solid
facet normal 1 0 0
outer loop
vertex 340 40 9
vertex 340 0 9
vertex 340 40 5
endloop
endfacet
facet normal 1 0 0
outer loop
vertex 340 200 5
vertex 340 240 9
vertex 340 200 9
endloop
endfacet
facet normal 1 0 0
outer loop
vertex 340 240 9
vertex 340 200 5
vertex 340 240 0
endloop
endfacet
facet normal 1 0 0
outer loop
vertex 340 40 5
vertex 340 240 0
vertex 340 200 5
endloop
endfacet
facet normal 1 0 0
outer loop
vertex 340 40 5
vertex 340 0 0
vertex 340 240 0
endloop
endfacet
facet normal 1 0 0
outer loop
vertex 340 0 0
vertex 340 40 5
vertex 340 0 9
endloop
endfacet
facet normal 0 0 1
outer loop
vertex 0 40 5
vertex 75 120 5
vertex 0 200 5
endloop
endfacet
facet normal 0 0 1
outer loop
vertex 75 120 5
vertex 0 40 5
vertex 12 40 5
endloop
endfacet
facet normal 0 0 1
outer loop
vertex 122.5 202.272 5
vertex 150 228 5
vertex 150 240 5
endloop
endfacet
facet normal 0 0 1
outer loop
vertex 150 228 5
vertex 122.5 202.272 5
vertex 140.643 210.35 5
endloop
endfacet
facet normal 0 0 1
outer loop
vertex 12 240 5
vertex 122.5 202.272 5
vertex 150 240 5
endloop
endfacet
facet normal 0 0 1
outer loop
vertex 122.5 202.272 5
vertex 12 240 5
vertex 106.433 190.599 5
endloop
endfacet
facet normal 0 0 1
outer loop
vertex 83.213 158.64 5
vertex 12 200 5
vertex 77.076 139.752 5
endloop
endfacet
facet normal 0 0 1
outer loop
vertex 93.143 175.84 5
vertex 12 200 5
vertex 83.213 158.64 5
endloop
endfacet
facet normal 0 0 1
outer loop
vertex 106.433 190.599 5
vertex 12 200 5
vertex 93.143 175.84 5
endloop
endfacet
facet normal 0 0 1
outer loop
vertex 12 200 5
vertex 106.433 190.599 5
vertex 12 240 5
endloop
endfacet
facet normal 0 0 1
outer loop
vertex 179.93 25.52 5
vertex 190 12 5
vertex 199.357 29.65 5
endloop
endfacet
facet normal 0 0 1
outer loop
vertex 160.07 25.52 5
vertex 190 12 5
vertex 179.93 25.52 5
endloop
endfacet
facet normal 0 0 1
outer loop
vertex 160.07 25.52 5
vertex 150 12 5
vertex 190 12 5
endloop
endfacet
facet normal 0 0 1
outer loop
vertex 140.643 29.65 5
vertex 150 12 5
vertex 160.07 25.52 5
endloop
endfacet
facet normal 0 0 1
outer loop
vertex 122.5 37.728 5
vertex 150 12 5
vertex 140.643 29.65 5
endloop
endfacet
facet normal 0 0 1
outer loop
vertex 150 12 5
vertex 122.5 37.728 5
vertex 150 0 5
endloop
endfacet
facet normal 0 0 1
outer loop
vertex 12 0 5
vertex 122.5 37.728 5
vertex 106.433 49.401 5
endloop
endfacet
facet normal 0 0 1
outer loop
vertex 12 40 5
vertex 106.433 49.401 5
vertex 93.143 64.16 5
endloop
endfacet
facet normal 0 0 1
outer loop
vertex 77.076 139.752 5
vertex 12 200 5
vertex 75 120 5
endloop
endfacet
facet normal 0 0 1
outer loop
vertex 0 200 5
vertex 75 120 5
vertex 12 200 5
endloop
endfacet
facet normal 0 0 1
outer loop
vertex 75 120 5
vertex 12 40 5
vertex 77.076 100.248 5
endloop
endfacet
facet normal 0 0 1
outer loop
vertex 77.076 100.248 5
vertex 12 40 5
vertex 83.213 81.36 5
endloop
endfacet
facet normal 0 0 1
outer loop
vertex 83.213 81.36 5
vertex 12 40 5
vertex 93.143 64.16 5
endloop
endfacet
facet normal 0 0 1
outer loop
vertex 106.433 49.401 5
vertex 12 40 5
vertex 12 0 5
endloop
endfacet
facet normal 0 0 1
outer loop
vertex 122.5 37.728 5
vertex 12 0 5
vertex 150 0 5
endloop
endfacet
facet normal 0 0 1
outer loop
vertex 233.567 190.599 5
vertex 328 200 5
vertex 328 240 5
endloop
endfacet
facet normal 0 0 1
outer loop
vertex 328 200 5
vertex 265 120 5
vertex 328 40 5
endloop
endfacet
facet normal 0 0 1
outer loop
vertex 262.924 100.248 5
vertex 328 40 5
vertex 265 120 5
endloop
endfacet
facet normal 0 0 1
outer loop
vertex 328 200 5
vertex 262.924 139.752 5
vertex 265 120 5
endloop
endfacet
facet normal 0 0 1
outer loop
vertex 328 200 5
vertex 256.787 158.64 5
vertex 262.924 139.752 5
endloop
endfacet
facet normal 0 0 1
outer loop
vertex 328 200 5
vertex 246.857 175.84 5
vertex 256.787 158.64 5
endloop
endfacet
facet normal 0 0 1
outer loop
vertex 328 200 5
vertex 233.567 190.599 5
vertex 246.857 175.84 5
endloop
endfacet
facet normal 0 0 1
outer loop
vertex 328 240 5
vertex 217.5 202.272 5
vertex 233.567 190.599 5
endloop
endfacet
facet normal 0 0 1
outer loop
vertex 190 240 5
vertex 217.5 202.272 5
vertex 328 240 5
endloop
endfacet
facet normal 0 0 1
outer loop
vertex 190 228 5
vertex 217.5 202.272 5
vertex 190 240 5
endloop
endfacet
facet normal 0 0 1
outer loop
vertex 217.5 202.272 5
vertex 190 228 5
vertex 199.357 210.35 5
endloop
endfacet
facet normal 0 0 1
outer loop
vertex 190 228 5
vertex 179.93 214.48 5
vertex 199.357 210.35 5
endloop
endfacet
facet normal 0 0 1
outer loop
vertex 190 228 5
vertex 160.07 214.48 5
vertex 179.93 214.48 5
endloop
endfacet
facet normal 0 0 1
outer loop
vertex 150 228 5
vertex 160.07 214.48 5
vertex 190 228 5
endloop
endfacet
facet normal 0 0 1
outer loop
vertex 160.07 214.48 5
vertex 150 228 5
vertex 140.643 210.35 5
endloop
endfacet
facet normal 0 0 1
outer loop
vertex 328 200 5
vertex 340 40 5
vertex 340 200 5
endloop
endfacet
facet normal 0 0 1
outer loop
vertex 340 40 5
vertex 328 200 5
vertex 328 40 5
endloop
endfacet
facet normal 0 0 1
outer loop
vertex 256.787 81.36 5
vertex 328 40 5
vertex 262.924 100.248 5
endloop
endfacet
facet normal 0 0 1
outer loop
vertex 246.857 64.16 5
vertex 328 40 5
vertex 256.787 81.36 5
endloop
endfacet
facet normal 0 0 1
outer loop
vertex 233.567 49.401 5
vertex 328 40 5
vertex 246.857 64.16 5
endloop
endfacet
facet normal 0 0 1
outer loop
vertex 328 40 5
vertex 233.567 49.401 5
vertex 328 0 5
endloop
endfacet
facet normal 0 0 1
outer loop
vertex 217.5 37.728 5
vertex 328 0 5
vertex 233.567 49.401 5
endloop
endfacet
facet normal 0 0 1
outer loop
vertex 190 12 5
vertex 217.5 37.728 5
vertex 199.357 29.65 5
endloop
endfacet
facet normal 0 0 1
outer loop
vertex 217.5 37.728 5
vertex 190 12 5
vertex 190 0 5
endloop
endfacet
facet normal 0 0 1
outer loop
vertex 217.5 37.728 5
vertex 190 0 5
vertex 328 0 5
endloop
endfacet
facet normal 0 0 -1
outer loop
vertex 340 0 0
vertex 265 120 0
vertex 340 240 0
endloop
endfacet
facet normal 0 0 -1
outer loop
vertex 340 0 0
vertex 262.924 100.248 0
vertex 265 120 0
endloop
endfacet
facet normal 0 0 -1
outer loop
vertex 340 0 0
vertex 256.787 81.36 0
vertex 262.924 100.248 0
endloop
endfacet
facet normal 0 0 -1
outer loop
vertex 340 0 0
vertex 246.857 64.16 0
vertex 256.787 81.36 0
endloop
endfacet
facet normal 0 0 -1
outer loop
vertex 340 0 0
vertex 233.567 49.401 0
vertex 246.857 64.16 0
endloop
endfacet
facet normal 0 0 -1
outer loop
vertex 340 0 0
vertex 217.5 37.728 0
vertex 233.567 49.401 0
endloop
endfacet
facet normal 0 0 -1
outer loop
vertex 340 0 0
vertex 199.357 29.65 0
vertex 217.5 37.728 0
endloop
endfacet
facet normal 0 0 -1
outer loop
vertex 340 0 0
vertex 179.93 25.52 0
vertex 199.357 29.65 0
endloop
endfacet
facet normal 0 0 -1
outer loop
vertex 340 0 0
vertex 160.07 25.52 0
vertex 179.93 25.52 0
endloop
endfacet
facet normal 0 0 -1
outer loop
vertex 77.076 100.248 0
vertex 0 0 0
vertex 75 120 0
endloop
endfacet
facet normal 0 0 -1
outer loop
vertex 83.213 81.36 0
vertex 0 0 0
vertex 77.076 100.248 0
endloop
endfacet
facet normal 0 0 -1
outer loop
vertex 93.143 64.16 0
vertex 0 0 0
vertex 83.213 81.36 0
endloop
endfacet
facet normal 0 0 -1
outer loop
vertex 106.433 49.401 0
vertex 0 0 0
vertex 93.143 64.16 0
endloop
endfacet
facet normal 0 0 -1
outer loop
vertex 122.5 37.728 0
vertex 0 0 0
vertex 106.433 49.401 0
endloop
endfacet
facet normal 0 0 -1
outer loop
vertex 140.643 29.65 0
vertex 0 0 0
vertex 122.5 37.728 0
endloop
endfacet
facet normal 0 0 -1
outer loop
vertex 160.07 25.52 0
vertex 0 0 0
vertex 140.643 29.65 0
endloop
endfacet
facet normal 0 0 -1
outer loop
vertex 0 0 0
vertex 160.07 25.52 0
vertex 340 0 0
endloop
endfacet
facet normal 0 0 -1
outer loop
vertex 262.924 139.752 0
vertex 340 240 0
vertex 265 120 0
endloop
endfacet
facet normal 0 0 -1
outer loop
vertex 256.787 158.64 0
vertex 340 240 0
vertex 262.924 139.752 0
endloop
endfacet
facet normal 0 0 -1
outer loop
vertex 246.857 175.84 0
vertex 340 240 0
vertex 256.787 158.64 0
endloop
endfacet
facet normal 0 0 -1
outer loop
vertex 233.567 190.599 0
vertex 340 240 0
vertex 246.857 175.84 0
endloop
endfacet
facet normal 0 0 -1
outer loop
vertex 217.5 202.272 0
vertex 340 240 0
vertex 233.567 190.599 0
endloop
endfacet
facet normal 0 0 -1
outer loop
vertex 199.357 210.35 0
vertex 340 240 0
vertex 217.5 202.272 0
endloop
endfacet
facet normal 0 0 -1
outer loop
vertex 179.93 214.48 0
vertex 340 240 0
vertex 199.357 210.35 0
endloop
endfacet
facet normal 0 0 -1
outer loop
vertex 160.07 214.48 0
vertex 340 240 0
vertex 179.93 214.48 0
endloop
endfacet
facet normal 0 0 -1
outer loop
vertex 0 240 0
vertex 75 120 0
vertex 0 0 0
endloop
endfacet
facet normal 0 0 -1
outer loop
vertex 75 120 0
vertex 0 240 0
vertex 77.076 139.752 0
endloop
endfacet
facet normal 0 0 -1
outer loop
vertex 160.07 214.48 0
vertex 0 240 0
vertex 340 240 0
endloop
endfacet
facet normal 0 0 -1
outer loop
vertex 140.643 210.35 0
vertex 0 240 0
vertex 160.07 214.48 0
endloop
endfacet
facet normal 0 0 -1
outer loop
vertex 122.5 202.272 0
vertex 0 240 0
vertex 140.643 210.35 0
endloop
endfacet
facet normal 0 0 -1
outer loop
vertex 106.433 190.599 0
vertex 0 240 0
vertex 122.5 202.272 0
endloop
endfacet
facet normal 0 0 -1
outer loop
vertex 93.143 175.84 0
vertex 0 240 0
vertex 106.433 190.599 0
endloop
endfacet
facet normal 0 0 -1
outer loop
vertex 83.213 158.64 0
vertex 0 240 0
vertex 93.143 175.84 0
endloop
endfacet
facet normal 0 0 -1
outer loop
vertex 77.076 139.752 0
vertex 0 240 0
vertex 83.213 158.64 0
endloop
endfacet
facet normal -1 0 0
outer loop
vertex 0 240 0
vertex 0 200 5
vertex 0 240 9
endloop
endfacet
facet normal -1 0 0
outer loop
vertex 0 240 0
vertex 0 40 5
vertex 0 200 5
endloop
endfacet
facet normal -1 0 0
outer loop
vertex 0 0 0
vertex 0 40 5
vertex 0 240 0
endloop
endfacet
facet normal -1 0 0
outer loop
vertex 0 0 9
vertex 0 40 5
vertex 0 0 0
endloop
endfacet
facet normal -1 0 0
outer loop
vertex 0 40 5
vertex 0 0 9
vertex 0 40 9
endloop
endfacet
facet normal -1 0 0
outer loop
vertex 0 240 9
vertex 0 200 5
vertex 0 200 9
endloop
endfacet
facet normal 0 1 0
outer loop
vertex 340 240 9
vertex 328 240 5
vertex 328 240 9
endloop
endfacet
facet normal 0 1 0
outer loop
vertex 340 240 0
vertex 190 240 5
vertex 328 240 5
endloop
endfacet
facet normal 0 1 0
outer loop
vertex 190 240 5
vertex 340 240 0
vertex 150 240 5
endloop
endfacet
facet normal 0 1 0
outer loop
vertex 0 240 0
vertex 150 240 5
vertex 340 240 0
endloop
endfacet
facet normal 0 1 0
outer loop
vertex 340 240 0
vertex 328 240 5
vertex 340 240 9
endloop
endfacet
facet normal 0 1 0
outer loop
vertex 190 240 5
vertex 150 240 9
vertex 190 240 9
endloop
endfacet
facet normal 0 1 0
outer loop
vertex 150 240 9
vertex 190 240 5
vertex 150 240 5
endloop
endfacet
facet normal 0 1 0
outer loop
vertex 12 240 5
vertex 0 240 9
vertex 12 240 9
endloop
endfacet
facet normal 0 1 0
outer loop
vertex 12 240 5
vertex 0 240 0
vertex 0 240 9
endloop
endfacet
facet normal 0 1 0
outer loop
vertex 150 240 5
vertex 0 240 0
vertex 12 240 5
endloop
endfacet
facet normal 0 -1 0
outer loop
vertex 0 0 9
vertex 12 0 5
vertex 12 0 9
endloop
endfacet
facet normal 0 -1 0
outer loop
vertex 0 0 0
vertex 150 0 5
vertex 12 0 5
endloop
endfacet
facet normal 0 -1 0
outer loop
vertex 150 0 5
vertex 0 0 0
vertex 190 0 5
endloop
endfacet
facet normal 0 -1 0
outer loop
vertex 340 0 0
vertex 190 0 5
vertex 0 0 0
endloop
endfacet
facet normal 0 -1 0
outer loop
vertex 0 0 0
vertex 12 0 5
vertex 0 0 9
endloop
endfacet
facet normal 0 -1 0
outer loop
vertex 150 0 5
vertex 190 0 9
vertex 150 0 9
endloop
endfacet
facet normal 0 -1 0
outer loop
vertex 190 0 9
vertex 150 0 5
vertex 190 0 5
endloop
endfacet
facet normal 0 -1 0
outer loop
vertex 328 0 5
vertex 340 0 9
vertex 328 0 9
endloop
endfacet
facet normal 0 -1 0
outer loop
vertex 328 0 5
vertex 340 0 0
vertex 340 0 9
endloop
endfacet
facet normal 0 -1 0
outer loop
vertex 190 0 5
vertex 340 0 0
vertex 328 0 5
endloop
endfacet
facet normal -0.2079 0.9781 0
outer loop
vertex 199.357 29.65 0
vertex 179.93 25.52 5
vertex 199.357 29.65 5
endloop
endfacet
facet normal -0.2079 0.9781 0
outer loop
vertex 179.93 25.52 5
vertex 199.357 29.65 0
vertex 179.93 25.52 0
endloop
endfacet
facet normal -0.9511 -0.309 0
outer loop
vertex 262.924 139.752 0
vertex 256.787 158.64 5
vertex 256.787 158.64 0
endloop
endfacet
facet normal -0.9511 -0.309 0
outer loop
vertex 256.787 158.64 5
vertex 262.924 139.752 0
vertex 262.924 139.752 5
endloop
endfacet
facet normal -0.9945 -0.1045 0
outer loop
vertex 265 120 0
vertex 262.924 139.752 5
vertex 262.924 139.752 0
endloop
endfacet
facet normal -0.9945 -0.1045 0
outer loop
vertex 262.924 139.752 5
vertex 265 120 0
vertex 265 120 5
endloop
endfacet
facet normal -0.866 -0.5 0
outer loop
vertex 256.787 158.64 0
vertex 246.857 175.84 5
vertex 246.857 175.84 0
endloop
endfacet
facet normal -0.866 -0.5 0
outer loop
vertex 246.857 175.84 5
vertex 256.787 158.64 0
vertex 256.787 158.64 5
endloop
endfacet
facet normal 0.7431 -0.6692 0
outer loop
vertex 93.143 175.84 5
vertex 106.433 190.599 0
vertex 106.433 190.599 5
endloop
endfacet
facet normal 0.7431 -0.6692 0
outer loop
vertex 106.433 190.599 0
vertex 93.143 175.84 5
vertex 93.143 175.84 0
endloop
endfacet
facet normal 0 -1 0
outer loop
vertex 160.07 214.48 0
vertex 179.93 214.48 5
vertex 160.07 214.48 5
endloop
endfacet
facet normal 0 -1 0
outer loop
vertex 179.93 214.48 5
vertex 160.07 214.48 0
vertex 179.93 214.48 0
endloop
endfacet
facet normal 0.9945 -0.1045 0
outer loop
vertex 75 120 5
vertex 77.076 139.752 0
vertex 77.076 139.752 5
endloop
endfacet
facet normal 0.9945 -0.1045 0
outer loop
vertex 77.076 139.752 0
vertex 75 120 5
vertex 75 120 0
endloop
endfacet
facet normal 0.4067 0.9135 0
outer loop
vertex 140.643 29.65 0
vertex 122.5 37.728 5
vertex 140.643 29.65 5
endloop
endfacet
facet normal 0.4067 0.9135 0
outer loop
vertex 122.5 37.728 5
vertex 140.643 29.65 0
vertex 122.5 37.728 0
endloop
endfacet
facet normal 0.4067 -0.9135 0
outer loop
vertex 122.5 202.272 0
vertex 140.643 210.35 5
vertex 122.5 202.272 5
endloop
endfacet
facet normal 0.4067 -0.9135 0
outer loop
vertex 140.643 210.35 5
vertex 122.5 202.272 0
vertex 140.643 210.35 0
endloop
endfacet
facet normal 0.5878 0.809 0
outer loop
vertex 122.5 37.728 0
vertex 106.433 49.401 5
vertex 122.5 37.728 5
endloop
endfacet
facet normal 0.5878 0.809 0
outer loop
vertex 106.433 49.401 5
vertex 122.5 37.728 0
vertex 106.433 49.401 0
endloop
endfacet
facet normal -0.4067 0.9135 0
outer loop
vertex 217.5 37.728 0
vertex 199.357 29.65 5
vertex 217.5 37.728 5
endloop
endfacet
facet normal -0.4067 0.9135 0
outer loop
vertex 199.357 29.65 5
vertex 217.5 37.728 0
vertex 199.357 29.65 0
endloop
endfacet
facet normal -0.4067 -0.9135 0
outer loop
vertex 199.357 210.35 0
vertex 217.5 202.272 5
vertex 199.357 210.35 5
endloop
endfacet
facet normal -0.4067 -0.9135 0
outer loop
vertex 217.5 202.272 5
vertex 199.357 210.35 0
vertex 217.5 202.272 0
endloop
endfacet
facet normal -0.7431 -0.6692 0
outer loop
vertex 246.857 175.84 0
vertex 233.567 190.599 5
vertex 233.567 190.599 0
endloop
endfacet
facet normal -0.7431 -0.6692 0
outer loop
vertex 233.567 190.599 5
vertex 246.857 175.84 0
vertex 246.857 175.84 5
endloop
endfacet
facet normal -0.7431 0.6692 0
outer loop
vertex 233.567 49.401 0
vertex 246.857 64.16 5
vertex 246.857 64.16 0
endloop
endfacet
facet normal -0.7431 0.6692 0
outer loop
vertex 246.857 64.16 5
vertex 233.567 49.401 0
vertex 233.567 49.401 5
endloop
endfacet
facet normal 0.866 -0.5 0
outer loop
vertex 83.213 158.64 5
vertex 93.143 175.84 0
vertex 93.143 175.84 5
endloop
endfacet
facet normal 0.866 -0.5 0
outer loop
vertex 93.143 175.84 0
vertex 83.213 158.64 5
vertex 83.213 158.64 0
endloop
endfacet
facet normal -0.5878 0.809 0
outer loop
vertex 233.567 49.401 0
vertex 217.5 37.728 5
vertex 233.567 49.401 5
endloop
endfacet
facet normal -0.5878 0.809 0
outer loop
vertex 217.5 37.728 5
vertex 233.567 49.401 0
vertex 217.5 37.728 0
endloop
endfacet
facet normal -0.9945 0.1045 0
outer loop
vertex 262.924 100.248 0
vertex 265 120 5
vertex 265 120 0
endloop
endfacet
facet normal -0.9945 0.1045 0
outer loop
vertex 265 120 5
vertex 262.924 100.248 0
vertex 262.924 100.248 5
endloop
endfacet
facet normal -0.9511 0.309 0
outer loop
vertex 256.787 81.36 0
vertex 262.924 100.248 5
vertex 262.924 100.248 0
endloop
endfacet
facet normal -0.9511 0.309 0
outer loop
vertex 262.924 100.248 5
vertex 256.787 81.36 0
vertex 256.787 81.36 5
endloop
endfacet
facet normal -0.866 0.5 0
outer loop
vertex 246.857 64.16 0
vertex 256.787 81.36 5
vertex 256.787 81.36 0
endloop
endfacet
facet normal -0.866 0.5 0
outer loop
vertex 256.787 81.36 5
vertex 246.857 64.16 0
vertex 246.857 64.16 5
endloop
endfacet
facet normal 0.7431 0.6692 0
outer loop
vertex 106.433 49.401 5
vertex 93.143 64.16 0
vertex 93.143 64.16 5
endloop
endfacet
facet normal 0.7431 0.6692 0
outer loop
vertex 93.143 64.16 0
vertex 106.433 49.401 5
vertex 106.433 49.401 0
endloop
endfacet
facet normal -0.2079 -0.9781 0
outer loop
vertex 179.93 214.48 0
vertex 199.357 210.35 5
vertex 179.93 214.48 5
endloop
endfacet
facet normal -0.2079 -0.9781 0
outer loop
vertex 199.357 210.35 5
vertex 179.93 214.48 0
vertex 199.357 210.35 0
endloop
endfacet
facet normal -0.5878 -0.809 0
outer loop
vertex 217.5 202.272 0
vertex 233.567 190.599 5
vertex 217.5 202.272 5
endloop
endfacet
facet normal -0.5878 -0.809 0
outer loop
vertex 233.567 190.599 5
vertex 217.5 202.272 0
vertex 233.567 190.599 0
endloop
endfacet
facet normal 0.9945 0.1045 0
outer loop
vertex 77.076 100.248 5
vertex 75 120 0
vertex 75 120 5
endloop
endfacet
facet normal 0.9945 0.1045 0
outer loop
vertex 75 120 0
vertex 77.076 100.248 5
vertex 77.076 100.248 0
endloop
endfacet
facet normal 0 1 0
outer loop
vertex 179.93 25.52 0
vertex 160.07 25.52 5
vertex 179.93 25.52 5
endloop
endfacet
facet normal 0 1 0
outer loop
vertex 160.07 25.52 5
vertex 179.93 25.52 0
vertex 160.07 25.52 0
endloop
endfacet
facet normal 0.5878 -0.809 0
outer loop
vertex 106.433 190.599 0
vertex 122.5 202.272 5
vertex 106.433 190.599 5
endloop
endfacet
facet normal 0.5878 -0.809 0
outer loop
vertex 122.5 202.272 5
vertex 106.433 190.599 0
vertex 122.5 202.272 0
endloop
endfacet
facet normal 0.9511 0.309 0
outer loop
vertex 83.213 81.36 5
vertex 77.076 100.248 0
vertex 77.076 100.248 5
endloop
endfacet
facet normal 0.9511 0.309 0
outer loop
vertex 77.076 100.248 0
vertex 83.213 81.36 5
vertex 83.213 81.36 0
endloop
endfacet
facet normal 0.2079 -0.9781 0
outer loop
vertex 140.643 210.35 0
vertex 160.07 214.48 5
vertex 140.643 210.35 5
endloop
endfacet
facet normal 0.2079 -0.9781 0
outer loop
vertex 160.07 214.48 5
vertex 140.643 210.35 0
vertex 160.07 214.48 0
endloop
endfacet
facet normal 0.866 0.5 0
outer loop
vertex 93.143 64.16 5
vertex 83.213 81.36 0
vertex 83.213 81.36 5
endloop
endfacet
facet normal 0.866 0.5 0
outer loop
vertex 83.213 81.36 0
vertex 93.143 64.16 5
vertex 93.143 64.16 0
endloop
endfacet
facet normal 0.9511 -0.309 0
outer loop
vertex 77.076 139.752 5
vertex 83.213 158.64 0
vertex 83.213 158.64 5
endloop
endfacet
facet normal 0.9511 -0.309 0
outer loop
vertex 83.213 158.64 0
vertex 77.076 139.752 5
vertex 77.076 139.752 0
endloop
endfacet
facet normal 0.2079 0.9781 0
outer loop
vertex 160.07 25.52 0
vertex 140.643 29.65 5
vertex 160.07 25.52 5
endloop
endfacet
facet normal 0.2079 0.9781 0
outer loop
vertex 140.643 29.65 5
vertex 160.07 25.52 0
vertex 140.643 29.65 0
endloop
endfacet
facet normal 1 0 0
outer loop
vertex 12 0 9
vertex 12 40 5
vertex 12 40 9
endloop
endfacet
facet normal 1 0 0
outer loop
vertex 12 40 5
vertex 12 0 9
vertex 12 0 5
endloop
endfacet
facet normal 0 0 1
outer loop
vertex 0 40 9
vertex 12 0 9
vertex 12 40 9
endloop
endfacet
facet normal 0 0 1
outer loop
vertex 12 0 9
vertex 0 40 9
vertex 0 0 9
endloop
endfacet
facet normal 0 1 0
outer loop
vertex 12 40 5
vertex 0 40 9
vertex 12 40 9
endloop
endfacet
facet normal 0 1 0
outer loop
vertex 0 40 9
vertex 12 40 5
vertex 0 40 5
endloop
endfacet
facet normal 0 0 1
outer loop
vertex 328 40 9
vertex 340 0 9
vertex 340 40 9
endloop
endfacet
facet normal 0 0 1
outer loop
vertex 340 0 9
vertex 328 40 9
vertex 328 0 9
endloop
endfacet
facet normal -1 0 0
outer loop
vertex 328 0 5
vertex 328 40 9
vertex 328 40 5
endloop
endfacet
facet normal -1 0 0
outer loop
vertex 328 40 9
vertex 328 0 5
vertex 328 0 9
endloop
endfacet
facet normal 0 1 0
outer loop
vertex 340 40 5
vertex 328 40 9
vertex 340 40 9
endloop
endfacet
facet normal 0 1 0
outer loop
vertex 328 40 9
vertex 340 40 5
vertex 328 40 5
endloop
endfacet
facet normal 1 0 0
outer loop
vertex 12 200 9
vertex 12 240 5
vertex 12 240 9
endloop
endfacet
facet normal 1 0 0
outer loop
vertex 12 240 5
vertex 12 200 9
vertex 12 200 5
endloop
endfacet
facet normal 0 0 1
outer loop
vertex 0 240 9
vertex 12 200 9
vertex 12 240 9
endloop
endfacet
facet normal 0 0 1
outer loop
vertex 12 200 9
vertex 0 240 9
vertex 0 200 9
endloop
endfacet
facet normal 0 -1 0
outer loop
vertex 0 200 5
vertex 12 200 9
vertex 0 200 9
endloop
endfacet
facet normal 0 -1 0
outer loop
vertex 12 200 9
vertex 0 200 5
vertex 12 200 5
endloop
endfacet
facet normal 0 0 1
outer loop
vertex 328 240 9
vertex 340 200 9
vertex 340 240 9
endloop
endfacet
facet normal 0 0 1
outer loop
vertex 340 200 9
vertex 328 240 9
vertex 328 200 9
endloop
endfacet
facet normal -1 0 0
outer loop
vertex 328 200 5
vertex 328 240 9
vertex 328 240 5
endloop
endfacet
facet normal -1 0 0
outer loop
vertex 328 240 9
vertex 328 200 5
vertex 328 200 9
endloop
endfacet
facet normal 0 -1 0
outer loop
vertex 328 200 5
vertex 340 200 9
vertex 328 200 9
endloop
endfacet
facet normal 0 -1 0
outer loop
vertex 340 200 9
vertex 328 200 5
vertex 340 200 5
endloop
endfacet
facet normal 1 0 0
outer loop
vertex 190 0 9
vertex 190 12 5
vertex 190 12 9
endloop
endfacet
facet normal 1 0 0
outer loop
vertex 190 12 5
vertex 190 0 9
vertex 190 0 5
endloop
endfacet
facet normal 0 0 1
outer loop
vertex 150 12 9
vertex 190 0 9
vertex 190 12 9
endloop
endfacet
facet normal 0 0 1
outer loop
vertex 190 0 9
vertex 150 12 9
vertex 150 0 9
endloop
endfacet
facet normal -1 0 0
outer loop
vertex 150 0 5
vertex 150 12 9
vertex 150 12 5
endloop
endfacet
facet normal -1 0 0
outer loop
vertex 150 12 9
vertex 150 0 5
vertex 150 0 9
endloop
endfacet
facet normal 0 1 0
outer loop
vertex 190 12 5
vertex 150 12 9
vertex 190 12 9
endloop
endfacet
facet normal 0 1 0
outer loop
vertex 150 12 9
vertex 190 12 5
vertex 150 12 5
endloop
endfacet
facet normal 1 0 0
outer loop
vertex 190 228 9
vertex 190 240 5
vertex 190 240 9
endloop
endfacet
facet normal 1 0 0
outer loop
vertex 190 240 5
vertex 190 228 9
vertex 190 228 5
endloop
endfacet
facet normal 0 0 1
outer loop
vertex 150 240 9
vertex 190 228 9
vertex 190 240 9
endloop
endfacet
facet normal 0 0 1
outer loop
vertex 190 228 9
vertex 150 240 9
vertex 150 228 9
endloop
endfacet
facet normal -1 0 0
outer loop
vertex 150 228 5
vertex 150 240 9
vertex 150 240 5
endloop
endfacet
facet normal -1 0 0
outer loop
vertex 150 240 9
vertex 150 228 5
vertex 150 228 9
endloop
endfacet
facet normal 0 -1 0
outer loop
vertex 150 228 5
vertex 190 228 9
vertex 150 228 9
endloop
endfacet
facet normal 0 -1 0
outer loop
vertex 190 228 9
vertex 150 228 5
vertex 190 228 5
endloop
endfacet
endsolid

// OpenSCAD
// Revision 1.2 (2026-Mar-23)
// The panel is 359mm x 269mm. There is a black frame of 20mm, so we can reduce the cover size.
panel_width = 340;
panel_depth = 240;
// The panel is 3mm high, the foot are 4mm hight. Total height 7mm.
panel_height = 5;
scope_diameter = 95;
foot_height = 4;
foot_width = 12;
foot_depth = 40;
module feet() {
    cube([foot_width, foot_depth, foot_height]);
}
difference() {
    cube([panel_width, panel_depth, panel_height]);
    #translate([panel_width/2, panel_depth/2])cylinder(panel_height, scope_diameter, scope_diameter);
}
// Corner feet
#translate([0, 0, panel_height])feet();
#translate([panel_width-foot_width, 0, panel_height])feet();
#translate([0, panel_depth-foot_depth, panel_height])feet();
#translate([panel_width-foot_width, panel_depth-foot_depth, panel_height])feet();
// Middle feet on long sides (rotated 90°)
#translate([panel_width/2-foot_depth/2, 0, panel_height])cube([foot_depth, foot_width, foot_height]);
#translate([panel_width/2-foot_depth/2, panel_depth-foot_width, panel_height])cube([foot_depth, foot_width, foot_height]);
